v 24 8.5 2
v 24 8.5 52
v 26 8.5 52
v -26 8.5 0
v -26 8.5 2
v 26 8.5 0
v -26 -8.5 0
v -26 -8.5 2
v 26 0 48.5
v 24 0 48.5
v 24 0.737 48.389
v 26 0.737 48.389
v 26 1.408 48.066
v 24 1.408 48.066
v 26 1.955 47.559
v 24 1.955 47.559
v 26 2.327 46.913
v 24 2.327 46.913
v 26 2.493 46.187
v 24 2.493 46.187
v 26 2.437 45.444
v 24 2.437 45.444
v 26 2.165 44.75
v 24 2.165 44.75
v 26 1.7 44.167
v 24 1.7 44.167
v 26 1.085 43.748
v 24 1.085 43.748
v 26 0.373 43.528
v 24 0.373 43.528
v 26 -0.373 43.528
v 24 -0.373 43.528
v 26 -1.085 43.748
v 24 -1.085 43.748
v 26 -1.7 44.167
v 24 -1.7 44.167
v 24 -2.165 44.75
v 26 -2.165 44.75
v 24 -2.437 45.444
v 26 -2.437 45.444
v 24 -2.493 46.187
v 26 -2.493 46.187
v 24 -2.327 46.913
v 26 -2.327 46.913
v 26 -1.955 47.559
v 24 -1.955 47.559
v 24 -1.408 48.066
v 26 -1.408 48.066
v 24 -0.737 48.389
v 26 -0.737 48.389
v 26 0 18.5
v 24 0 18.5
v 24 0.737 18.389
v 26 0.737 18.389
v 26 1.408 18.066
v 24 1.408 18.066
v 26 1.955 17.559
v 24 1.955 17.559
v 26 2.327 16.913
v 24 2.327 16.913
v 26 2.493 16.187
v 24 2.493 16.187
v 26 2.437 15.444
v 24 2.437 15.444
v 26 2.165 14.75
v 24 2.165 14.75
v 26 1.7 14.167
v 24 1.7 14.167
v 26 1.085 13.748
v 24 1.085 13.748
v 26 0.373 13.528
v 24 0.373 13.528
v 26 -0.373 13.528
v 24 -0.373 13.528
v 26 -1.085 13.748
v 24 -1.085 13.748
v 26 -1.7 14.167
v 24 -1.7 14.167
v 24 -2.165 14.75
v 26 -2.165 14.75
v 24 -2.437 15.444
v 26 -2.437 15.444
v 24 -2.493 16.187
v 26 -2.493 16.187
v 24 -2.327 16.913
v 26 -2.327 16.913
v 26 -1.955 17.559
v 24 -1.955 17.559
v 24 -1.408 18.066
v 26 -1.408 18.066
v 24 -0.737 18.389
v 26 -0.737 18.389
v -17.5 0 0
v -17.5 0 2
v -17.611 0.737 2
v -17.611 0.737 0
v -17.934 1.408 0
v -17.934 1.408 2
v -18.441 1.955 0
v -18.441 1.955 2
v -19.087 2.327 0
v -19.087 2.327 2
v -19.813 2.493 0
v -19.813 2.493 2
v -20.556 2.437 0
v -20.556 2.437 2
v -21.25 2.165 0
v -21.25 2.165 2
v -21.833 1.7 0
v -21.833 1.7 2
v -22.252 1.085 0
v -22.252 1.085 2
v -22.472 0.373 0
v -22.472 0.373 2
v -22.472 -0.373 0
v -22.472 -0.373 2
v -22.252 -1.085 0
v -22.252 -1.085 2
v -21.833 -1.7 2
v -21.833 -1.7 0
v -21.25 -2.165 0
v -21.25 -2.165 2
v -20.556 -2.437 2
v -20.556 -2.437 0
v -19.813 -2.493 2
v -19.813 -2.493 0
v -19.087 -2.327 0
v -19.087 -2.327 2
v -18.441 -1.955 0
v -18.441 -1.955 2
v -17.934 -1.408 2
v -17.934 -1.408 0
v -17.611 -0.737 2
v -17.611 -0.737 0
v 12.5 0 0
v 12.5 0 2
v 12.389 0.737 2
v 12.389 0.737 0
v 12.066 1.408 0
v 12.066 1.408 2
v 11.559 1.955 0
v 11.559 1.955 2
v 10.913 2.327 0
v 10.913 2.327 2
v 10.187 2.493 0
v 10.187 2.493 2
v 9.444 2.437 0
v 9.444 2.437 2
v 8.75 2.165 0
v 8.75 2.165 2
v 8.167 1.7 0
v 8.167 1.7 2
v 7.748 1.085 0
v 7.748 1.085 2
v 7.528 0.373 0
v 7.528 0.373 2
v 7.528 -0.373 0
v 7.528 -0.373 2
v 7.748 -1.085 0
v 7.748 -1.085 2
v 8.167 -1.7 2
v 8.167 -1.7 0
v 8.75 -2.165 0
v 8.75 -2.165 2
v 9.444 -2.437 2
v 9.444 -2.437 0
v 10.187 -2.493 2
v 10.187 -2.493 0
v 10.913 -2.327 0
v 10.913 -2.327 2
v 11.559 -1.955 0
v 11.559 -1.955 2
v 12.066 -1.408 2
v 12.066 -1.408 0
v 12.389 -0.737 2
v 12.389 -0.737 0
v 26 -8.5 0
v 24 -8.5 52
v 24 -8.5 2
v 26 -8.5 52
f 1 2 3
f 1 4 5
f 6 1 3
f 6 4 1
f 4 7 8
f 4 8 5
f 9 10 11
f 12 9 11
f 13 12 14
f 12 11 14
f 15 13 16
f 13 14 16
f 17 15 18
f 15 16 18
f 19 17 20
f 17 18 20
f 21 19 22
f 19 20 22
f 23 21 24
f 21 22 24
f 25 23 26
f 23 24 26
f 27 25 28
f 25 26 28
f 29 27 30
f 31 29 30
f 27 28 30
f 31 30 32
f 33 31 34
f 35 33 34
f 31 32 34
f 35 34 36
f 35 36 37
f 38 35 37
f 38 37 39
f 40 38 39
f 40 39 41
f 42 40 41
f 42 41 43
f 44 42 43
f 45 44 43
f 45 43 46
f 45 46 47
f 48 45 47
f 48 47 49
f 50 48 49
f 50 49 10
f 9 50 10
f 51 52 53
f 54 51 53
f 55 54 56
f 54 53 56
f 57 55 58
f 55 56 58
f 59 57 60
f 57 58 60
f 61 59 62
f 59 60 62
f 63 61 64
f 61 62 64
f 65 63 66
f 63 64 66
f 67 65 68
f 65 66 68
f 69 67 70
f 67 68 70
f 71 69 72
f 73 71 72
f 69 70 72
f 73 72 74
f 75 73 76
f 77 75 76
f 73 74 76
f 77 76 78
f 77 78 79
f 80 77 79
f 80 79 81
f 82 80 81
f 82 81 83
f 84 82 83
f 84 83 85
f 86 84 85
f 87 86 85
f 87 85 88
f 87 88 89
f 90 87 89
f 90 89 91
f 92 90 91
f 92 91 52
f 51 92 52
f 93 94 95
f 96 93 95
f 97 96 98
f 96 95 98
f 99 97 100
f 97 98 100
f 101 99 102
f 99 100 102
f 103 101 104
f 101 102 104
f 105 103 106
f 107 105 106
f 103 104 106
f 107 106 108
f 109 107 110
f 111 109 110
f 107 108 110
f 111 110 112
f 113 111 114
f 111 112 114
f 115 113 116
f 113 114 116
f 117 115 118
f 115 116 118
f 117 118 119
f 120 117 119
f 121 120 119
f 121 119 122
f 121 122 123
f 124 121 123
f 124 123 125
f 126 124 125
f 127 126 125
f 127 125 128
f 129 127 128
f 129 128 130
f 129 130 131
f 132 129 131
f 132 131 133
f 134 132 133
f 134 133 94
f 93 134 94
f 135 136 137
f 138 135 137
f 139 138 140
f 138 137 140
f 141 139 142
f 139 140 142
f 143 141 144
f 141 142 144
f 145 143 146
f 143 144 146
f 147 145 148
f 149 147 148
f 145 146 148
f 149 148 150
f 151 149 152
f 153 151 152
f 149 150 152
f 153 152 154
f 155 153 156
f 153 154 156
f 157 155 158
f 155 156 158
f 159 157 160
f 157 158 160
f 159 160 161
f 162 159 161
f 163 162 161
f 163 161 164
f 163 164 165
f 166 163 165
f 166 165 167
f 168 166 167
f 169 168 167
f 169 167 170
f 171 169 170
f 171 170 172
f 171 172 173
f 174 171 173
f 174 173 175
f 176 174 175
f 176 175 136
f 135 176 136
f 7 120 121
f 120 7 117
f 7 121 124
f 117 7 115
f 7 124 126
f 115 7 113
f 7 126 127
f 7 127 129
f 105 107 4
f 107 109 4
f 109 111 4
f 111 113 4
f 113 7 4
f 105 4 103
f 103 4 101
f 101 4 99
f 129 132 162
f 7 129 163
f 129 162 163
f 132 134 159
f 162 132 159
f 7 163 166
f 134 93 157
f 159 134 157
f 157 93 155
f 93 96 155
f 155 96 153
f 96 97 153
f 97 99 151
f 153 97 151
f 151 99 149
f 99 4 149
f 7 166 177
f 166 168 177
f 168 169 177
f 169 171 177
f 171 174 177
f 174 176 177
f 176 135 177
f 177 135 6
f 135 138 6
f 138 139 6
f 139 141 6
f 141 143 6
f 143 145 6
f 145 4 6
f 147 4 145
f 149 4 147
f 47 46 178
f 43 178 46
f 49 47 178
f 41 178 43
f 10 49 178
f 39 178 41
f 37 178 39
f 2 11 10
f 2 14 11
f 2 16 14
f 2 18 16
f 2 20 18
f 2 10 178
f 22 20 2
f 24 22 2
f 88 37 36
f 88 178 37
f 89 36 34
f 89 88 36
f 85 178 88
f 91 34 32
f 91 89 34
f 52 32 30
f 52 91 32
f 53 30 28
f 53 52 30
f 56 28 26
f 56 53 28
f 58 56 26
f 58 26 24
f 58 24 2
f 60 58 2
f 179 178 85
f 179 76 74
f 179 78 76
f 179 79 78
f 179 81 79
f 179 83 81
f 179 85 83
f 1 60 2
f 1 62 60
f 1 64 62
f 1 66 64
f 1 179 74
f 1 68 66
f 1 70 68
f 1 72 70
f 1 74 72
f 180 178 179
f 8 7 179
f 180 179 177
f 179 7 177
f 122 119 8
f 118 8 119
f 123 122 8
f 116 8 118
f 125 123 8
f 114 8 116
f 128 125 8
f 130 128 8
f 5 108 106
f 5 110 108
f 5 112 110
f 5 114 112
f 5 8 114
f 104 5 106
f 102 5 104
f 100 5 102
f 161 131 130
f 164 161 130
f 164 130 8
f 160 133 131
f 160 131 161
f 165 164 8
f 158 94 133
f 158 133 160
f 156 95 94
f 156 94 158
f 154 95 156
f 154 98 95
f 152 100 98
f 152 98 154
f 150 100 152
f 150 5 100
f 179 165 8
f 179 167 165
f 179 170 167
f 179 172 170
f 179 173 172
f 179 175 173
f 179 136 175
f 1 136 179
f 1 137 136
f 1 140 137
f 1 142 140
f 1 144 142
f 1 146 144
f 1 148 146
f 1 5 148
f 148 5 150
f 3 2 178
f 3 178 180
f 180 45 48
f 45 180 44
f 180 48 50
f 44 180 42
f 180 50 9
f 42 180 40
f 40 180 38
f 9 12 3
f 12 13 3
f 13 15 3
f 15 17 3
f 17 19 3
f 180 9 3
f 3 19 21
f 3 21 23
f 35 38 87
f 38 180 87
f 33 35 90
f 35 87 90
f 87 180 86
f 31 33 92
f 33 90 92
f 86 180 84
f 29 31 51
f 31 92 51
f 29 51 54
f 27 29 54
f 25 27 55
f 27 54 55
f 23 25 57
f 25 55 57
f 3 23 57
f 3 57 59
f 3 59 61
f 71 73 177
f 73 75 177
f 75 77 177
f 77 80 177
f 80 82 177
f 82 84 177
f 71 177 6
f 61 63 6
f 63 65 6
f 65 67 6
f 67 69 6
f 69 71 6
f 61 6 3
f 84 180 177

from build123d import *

# Parameters (mm, degrees)
ESQUISSE1_W             = 52
ESQUISSE1_H             = 17
BOSS_EXTRU_1_DEPTH      = 2
ESQUISSE2_W             = 2
ESQUISSE2_H             = 17
BOSS_EXTRU_2_DEPTH      = 50
ESQUISSE3_R             = 2.5
ENL_V_MAT_EXTRU_1_DEPTH = 50
ESQUISSE4_R             = 2.5
ENL_V_MAT_EXTRU_2_DEPTH = 50


with BuildPart() as part:
    # Esquisse1 → Boss.-Extru.1 (new body)
    with BuildSketch(Plane.XY):
        Rectangle(ESQUISSE1_W, ESQUISSE1_H)
    extrude(amount=BOSS_EXTRU_1_DEPTH)

    # Esquisse2 → Boss.-Extru.2 (add)
    with BuildSketch(Plane.XY.offset(2)):
        with Locations((25, 0)):
            Rectangle(ESQUISSE2_W, ESQUISSE2_H)
    extrude(amount=BOSS_EXTRU_2_DEPTH)

    # Esquisse3 → Enlèv. mat.-Extru.1 (cut)
    with BuildSketch(Plane.XY.offset(2)):
        with Locations((-20, 0)):
            Circle(ESQUISSE3_R)
        with Locations((10, 0)):
            Circle(ESQUISSE3_R)
    extrude(amount=-ENL_V_MAT_EXTRU_1_DEPTH, mode=Mode.SUBTRACT)

    # Esquisse4 → Enlèv. mat.-Extru.2 (cut)
    with BuildSketch(Plane.ZY.offset(-24)):
        with Locations((46, 0)):
            Circle(ESQUISSE4_R)
        with Locations((16, 0)):
            Circle(ESQUISSE4_R)
    extrude(amount=-ENL_V_MAT_EXTRU_2_DEPTH, mode=Mode.SUBTRACT)


solid = part.part
